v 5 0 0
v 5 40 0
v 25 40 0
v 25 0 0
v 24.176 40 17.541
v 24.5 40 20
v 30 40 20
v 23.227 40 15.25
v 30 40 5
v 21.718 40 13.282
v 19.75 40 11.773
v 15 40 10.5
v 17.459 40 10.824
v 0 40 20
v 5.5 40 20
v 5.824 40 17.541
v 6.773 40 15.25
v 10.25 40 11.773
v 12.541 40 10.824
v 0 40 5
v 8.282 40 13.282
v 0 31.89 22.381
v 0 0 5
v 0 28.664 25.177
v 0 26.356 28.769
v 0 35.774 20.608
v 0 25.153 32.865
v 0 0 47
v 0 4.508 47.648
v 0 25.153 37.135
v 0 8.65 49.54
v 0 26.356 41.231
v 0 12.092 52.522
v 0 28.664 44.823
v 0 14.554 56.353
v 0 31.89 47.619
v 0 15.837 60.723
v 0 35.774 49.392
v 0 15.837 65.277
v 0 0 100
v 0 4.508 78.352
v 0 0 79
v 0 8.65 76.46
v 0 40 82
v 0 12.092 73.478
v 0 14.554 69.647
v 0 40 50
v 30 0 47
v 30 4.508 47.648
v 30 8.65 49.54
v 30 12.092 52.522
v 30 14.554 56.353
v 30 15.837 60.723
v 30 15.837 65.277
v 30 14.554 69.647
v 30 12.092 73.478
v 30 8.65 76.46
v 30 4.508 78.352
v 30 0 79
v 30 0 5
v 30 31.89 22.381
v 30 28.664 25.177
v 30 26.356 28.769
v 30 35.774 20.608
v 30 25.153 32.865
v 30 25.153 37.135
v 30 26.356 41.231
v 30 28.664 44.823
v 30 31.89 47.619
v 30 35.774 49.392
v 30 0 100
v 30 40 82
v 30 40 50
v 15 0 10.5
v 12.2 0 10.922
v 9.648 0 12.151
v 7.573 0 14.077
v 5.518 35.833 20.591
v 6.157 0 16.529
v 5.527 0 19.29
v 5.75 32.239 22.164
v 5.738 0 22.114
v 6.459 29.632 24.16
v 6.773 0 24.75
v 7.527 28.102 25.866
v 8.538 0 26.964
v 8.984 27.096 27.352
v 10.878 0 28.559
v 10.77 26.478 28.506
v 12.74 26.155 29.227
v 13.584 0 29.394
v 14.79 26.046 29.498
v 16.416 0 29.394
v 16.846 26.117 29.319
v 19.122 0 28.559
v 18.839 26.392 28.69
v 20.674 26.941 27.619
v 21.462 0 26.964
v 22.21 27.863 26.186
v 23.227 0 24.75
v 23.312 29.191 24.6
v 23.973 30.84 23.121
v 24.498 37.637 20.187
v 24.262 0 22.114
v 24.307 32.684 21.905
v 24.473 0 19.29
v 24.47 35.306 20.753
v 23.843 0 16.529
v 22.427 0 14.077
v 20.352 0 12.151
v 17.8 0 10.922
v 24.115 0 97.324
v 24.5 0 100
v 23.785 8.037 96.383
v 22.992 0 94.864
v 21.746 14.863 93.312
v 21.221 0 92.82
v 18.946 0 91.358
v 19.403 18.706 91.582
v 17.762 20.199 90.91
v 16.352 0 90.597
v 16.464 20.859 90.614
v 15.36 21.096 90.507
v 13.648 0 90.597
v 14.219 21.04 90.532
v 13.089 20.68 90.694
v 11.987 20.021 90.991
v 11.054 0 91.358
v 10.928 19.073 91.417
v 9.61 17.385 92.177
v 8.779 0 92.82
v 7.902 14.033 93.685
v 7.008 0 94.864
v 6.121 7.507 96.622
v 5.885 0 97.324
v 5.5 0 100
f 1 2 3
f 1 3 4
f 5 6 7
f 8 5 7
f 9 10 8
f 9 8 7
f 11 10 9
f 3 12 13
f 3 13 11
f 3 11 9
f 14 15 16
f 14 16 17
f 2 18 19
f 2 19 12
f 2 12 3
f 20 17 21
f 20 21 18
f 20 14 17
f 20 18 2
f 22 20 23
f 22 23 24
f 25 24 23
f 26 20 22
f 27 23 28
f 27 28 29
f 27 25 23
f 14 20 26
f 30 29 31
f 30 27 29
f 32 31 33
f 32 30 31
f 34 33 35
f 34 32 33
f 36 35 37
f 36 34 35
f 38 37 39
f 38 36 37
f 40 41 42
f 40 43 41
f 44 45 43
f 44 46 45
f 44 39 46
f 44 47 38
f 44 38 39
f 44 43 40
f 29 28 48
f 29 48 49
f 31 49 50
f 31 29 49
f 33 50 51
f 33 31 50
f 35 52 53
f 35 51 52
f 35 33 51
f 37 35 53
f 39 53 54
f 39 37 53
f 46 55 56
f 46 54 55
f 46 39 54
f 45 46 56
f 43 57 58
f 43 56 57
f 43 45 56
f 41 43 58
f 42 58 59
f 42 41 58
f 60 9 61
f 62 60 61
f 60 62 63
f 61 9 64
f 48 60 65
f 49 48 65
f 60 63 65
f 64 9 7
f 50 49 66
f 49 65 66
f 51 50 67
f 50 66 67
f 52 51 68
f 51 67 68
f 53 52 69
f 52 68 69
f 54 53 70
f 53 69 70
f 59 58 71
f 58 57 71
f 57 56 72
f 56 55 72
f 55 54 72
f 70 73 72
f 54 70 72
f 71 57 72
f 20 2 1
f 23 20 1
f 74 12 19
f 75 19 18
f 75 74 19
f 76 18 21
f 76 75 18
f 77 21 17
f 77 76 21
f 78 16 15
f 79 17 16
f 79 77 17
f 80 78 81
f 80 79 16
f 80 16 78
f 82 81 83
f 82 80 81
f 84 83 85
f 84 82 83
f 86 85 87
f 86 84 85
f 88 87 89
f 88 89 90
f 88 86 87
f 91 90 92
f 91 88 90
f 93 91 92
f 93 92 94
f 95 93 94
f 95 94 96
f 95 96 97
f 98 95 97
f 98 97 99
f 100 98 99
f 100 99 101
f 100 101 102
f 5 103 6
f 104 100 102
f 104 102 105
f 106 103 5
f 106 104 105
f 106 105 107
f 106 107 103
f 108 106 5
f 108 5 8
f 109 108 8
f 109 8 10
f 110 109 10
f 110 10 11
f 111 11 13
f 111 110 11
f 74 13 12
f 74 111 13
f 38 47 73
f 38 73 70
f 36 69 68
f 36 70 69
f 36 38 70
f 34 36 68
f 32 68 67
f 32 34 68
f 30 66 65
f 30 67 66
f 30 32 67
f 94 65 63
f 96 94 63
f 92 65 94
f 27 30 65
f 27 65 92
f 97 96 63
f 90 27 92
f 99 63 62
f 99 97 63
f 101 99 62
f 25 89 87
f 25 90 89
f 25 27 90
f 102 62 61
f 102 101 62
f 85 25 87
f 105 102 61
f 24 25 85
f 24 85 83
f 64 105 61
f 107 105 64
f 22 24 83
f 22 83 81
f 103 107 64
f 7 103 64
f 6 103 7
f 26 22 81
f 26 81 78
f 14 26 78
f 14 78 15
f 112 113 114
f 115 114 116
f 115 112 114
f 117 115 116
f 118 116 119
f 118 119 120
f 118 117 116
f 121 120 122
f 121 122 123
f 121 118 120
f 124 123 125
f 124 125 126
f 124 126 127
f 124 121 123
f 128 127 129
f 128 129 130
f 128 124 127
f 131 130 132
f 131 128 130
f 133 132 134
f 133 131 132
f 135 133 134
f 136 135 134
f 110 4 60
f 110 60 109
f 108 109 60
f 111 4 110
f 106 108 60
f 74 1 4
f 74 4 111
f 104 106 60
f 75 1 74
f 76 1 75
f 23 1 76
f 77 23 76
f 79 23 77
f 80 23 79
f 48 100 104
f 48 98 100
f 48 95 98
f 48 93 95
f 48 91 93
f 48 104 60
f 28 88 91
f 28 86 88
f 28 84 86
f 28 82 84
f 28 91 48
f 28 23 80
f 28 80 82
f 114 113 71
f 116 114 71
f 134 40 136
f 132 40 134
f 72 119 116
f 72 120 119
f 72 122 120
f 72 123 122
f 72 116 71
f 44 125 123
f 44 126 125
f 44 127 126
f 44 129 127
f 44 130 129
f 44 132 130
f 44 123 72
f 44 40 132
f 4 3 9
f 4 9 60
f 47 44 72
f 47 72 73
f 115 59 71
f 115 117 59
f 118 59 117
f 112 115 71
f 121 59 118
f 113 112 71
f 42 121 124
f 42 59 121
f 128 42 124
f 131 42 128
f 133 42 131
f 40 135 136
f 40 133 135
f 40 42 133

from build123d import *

# Parameters (mm, degrees)
SALIENTE_EXTRUIR1_DEPTH    = 30
CORTAR_EXTRUIR1_DEPTH      = 54
CORTAR_EXTRUIR1_DEPTH_BACK = 94
CROQUIS2_R                 = 9.5
CORTAR_EXTRUIR2_DEPTH      = 94
CORTAR_EXTRUIR2_DEPTH_BACK = 94
CROQUIS3_R                 = 15
CROQUIS3_R_2               = 16
CHAFL_N1_SIZE              = 5


with BuildPart() as part:
    # Croquis1 → Saliente-Extruir1 (new body)
    with BuildSketch(Plane(origin=(0, 0, 0), x_dir=(0, 0, -1), z_dir=(1, 0, 0))):
        Polygon((-100, 0), (-82, 40), (0, 40), (0, 0), align=None)
    extrude(amount=SALIENTE_EXTRUIR1_DEPTH)

    # Croquis2 → Cortar-Extruir1 (cut, two sides: drawn at the far end of the back side and taken through both)
    with BuildSketch(Plane(origin=(0, 40, 0), x_dir=(1, 0, 0), z_dir=(0, 1, 0)).offset(-CORTAR_EXTRUIR1_DEPTH_BACK)):
        with Locations((15, -100)):
            Circle(CROQUIS2_R)
        with Locations((15, -20)):
            Circle(CROQUIS2_R)
    extrude(amount=CORTAR_EXTRUIR1_DEPTH + CORTAR_EXTRUIR1_DEPTH_BACK, mode=Mode.SUBTRACT)

    # Croquis3 → Cortar-Extruir2 (cut, two sides: drawn at the far end of the back side and taken through both)
    with BuildSketch(Plane(origin=(30, 0, 0), x_dir=(0, 0, -1), z_dir=(1, 0, 0)).offset(-CORTAR_EXTRUIR2_DEPTH_BACK)):
        with Locations((-35, 40)):
            Circle(CROQUIS3_R)
        with Locations((-63, 0)):
            Circle(CROQUIS3_R_2)
    extrude(amount=CORTAR_EXTRUIR2_DEPTH + CORTAR_EXTRUIR2_DEPTH_BACK, mode=Mode.SUBTRACT)

    # Chaflán1
    chafl_n1_edges = [part.edges().sort_by_distance(p)[0] for p in [
        (0, 20, 0),
        (30, 20, 0),
    ]]
    chamfer(chafl_n1_edges, length=CHAFL_N1_SIZE)


solid = part.part
